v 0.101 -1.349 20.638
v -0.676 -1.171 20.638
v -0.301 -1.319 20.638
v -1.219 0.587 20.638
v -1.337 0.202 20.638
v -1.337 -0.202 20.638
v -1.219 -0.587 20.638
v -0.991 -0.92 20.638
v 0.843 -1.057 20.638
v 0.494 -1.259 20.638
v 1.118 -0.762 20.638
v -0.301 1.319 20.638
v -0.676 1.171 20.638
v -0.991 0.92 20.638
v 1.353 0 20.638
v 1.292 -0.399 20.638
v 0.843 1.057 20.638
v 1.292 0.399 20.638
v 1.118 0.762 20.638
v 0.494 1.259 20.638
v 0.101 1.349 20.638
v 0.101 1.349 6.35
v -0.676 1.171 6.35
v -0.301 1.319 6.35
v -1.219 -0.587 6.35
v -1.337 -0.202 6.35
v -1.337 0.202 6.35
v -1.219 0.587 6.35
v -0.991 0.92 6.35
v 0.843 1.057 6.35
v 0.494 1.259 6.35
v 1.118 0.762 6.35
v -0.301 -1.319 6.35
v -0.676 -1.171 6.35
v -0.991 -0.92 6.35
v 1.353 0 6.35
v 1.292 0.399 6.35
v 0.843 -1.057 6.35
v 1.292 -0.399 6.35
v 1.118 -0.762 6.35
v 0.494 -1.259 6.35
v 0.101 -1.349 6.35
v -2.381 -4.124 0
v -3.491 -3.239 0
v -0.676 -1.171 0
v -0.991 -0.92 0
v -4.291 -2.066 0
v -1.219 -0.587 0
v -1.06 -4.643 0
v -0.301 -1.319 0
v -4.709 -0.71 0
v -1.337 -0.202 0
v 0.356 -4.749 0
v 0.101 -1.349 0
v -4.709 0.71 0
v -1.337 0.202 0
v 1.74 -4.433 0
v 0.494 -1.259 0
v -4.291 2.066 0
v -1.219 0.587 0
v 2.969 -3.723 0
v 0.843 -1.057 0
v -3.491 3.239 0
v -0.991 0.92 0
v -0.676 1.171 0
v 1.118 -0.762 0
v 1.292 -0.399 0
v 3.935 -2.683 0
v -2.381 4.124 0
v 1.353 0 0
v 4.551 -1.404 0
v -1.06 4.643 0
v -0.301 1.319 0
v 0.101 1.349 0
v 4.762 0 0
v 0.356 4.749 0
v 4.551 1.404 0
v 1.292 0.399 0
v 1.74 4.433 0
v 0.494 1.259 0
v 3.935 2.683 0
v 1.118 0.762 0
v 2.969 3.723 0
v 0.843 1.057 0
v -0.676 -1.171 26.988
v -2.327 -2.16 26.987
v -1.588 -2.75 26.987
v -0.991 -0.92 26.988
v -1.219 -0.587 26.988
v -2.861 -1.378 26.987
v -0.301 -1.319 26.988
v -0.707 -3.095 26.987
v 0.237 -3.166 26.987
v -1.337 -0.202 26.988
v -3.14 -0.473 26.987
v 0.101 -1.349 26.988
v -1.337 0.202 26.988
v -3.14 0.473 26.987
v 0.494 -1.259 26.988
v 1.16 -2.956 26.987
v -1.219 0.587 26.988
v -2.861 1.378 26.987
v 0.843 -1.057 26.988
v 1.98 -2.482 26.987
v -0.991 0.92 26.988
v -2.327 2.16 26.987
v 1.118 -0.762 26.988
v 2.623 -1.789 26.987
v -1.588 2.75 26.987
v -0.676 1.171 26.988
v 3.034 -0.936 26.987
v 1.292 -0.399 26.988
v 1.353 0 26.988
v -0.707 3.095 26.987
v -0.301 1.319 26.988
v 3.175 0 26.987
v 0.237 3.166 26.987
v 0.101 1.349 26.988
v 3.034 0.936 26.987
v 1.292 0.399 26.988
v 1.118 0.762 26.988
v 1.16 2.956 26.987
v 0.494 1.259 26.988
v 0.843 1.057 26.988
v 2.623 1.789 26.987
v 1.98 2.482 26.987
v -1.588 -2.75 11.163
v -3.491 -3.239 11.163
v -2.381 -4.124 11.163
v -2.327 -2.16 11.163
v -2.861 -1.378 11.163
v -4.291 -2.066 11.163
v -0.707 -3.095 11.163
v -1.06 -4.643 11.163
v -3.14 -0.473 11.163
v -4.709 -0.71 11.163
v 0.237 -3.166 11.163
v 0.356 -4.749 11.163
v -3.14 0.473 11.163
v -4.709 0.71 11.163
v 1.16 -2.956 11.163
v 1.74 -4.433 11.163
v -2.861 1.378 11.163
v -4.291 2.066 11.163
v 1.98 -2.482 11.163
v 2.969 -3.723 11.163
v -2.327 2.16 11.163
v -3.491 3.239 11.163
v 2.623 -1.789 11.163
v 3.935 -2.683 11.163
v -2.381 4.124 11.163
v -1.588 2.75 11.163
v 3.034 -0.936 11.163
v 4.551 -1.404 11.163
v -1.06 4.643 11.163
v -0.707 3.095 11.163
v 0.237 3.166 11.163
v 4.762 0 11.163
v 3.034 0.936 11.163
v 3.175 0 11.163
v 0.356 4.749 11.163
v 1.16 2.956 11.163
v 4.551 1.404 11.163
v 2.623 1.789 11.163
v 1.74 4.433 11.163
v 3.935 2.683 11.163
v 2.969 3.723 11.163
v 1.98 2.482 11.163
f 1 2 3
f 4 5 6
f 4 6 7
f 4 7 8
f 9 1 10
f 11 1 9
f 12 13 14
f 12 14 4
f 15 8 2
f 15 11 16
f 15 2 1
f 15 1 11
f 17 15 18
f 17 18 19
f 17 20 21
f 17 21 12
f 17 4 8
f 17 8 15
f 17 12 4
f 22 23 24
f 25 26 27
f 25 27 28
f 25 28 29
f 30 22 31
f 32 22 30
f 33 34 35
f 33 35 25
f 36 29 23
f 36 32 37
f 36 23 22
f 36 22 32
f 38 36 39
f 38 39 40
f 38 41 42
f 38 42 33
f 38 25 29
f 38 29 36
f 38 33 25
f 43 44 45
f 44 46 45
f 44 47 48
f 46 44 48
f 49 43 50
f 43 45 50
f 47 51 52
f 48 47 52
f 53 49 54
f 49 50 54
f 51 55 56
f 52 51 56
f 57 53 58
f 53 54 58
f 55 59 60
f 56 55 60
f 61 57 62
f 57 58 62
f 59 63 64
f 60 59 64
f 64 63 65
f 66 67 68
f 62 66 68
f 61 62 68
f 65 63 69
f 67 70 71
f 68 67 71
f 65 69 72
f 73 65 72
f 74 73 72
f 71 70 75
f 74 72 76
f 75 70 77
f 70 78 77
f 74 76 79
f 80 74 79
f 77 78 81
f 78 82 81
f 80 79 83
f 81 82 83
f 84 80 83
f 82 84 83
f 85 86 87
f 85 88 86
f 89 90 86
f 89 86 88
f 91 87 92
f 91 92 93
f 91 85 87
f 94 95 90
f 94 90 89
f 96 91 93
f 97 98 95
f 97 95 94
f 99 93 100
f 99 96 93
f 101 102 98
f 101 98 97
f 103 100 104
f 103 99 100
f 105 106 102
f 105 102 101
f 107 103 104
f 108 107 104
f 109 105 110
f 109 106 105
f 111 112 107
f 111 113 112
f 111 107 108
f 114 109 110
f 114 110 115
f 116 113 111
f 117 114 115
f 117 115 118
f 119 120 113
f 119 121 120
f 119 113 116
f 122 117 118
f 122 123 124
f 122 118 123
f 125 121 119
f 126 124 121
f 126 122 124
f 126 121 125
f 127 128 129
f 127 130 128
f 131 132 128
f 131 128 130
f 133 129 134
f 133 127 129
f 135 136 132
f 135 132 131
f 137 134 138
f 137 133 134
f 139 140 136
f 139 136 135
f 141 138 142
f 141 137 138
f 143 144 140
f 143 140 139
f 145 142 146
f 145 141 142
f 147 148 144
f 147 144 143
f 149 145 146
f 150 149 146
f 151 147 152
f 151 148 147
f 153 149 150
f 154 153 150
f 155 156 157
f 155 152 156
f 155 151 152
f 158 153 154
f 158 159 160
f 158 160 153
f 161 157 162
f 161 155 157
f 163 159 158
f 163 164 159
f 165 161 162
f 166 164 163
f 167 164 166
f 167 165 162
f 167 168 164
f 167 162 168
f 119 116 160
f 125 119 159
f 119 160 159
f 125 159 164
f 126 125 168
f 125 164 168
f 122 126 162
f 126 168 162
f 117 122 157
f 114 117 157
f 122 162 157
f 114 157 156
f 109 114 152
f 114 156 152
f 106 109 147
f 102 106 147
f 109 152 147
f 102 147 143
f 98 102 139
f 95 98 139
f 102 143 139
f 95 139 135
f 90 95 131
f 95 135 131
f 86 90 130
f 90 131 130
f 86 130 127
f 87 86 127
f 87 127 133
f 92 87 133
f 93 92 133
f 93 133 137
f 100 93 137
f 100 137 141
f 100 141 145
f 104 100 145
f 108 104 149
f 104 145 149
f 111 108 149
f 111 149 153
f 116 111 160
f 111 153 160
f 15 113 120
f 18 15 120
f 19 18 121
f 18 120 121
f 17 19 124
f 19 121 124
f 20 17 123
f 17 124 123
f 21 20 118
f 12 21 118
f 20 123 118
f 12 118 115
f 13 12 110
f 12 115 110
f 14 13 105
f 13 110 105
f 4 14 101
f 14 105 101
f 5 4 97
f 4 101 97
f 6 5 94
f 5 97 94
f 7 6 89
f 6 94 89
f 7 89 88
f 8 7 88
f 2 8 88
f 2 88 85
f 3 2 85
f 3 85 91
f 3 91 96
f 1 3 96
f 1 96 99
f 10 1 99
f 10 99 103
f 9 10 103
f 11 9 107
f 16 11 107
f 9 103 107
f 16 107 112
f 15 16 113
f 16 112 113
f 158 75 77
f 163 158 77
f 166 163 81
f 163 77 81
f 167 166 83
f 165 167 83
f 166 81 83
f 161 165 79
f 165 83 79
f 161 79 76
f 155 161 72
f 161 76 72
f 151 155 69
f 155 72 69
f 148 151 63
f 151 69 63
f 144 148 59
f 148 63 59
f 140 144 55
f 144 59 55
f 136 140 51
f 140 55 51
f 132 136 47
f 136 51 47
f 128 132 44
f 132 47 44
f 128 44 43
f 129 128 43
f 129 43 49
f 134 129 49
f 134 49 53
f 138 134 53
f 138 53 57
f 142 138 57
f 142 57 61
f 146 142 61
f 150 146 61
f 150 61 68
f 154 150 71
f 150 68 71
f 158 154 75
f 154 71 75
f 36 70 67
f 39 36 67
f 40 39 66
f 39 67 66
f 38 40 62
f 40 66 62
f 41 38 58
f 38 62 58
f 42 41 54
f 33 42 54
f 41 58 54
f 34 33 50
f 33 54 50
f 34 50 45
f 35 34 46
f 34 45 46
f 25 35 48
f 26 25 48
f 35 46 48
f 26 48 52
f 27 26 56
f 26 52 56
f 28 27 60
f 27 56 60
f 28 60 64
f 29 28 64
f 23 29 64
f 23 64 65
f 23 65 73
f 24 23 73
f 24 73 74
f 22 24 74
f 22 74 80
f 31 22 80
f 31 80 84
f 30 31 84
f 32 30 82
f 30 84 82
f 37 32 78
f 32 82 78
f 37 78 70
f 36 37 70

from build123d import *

# Parameters (mm, degrees)
F0_R     = 4.7625
F1_DEPTH = 11.1633
F2_R     = 3.175
F3_DEPTH = 15.8242
F4_R     = 1.35255
F5_DEPTH = 6.35
F6_R     = 1.35255
F7_DEPTH = 6.35


with BuildPart() as f1:
    # F0 (on Top) → F1 (new body)
    with BuildSketch(Plane.XY):
        Circle(F0_R)
    extrude(amount=F1_DEPTH)

    # F2 (on face) → F3 (join)
    with BuildSketch(Plane.XY.offset(11.1633)):
        Circle(F2_R)
    extrude(amount=F3_DEPTH)

    # F4 (on face) → F5 (cut)
    with BuildSketch(Plane(origin=(0, 0, 0), x_dir=(1, 0, 0), z_dir=(0, 0, -1))):
        Circle(F4_R)
    extrude(amount=-F5_DEPTH, mode=Mode.SUBTRACT)

    # F6 (on face) → F7 (cut)
    with BuildSketch(Plane.XY.offset(26.9875)):
        Circle(F6_R)
    extrude(amount=-F7_DEPTH, mode=Mode.SUBTRACT)


solid = f1.part
